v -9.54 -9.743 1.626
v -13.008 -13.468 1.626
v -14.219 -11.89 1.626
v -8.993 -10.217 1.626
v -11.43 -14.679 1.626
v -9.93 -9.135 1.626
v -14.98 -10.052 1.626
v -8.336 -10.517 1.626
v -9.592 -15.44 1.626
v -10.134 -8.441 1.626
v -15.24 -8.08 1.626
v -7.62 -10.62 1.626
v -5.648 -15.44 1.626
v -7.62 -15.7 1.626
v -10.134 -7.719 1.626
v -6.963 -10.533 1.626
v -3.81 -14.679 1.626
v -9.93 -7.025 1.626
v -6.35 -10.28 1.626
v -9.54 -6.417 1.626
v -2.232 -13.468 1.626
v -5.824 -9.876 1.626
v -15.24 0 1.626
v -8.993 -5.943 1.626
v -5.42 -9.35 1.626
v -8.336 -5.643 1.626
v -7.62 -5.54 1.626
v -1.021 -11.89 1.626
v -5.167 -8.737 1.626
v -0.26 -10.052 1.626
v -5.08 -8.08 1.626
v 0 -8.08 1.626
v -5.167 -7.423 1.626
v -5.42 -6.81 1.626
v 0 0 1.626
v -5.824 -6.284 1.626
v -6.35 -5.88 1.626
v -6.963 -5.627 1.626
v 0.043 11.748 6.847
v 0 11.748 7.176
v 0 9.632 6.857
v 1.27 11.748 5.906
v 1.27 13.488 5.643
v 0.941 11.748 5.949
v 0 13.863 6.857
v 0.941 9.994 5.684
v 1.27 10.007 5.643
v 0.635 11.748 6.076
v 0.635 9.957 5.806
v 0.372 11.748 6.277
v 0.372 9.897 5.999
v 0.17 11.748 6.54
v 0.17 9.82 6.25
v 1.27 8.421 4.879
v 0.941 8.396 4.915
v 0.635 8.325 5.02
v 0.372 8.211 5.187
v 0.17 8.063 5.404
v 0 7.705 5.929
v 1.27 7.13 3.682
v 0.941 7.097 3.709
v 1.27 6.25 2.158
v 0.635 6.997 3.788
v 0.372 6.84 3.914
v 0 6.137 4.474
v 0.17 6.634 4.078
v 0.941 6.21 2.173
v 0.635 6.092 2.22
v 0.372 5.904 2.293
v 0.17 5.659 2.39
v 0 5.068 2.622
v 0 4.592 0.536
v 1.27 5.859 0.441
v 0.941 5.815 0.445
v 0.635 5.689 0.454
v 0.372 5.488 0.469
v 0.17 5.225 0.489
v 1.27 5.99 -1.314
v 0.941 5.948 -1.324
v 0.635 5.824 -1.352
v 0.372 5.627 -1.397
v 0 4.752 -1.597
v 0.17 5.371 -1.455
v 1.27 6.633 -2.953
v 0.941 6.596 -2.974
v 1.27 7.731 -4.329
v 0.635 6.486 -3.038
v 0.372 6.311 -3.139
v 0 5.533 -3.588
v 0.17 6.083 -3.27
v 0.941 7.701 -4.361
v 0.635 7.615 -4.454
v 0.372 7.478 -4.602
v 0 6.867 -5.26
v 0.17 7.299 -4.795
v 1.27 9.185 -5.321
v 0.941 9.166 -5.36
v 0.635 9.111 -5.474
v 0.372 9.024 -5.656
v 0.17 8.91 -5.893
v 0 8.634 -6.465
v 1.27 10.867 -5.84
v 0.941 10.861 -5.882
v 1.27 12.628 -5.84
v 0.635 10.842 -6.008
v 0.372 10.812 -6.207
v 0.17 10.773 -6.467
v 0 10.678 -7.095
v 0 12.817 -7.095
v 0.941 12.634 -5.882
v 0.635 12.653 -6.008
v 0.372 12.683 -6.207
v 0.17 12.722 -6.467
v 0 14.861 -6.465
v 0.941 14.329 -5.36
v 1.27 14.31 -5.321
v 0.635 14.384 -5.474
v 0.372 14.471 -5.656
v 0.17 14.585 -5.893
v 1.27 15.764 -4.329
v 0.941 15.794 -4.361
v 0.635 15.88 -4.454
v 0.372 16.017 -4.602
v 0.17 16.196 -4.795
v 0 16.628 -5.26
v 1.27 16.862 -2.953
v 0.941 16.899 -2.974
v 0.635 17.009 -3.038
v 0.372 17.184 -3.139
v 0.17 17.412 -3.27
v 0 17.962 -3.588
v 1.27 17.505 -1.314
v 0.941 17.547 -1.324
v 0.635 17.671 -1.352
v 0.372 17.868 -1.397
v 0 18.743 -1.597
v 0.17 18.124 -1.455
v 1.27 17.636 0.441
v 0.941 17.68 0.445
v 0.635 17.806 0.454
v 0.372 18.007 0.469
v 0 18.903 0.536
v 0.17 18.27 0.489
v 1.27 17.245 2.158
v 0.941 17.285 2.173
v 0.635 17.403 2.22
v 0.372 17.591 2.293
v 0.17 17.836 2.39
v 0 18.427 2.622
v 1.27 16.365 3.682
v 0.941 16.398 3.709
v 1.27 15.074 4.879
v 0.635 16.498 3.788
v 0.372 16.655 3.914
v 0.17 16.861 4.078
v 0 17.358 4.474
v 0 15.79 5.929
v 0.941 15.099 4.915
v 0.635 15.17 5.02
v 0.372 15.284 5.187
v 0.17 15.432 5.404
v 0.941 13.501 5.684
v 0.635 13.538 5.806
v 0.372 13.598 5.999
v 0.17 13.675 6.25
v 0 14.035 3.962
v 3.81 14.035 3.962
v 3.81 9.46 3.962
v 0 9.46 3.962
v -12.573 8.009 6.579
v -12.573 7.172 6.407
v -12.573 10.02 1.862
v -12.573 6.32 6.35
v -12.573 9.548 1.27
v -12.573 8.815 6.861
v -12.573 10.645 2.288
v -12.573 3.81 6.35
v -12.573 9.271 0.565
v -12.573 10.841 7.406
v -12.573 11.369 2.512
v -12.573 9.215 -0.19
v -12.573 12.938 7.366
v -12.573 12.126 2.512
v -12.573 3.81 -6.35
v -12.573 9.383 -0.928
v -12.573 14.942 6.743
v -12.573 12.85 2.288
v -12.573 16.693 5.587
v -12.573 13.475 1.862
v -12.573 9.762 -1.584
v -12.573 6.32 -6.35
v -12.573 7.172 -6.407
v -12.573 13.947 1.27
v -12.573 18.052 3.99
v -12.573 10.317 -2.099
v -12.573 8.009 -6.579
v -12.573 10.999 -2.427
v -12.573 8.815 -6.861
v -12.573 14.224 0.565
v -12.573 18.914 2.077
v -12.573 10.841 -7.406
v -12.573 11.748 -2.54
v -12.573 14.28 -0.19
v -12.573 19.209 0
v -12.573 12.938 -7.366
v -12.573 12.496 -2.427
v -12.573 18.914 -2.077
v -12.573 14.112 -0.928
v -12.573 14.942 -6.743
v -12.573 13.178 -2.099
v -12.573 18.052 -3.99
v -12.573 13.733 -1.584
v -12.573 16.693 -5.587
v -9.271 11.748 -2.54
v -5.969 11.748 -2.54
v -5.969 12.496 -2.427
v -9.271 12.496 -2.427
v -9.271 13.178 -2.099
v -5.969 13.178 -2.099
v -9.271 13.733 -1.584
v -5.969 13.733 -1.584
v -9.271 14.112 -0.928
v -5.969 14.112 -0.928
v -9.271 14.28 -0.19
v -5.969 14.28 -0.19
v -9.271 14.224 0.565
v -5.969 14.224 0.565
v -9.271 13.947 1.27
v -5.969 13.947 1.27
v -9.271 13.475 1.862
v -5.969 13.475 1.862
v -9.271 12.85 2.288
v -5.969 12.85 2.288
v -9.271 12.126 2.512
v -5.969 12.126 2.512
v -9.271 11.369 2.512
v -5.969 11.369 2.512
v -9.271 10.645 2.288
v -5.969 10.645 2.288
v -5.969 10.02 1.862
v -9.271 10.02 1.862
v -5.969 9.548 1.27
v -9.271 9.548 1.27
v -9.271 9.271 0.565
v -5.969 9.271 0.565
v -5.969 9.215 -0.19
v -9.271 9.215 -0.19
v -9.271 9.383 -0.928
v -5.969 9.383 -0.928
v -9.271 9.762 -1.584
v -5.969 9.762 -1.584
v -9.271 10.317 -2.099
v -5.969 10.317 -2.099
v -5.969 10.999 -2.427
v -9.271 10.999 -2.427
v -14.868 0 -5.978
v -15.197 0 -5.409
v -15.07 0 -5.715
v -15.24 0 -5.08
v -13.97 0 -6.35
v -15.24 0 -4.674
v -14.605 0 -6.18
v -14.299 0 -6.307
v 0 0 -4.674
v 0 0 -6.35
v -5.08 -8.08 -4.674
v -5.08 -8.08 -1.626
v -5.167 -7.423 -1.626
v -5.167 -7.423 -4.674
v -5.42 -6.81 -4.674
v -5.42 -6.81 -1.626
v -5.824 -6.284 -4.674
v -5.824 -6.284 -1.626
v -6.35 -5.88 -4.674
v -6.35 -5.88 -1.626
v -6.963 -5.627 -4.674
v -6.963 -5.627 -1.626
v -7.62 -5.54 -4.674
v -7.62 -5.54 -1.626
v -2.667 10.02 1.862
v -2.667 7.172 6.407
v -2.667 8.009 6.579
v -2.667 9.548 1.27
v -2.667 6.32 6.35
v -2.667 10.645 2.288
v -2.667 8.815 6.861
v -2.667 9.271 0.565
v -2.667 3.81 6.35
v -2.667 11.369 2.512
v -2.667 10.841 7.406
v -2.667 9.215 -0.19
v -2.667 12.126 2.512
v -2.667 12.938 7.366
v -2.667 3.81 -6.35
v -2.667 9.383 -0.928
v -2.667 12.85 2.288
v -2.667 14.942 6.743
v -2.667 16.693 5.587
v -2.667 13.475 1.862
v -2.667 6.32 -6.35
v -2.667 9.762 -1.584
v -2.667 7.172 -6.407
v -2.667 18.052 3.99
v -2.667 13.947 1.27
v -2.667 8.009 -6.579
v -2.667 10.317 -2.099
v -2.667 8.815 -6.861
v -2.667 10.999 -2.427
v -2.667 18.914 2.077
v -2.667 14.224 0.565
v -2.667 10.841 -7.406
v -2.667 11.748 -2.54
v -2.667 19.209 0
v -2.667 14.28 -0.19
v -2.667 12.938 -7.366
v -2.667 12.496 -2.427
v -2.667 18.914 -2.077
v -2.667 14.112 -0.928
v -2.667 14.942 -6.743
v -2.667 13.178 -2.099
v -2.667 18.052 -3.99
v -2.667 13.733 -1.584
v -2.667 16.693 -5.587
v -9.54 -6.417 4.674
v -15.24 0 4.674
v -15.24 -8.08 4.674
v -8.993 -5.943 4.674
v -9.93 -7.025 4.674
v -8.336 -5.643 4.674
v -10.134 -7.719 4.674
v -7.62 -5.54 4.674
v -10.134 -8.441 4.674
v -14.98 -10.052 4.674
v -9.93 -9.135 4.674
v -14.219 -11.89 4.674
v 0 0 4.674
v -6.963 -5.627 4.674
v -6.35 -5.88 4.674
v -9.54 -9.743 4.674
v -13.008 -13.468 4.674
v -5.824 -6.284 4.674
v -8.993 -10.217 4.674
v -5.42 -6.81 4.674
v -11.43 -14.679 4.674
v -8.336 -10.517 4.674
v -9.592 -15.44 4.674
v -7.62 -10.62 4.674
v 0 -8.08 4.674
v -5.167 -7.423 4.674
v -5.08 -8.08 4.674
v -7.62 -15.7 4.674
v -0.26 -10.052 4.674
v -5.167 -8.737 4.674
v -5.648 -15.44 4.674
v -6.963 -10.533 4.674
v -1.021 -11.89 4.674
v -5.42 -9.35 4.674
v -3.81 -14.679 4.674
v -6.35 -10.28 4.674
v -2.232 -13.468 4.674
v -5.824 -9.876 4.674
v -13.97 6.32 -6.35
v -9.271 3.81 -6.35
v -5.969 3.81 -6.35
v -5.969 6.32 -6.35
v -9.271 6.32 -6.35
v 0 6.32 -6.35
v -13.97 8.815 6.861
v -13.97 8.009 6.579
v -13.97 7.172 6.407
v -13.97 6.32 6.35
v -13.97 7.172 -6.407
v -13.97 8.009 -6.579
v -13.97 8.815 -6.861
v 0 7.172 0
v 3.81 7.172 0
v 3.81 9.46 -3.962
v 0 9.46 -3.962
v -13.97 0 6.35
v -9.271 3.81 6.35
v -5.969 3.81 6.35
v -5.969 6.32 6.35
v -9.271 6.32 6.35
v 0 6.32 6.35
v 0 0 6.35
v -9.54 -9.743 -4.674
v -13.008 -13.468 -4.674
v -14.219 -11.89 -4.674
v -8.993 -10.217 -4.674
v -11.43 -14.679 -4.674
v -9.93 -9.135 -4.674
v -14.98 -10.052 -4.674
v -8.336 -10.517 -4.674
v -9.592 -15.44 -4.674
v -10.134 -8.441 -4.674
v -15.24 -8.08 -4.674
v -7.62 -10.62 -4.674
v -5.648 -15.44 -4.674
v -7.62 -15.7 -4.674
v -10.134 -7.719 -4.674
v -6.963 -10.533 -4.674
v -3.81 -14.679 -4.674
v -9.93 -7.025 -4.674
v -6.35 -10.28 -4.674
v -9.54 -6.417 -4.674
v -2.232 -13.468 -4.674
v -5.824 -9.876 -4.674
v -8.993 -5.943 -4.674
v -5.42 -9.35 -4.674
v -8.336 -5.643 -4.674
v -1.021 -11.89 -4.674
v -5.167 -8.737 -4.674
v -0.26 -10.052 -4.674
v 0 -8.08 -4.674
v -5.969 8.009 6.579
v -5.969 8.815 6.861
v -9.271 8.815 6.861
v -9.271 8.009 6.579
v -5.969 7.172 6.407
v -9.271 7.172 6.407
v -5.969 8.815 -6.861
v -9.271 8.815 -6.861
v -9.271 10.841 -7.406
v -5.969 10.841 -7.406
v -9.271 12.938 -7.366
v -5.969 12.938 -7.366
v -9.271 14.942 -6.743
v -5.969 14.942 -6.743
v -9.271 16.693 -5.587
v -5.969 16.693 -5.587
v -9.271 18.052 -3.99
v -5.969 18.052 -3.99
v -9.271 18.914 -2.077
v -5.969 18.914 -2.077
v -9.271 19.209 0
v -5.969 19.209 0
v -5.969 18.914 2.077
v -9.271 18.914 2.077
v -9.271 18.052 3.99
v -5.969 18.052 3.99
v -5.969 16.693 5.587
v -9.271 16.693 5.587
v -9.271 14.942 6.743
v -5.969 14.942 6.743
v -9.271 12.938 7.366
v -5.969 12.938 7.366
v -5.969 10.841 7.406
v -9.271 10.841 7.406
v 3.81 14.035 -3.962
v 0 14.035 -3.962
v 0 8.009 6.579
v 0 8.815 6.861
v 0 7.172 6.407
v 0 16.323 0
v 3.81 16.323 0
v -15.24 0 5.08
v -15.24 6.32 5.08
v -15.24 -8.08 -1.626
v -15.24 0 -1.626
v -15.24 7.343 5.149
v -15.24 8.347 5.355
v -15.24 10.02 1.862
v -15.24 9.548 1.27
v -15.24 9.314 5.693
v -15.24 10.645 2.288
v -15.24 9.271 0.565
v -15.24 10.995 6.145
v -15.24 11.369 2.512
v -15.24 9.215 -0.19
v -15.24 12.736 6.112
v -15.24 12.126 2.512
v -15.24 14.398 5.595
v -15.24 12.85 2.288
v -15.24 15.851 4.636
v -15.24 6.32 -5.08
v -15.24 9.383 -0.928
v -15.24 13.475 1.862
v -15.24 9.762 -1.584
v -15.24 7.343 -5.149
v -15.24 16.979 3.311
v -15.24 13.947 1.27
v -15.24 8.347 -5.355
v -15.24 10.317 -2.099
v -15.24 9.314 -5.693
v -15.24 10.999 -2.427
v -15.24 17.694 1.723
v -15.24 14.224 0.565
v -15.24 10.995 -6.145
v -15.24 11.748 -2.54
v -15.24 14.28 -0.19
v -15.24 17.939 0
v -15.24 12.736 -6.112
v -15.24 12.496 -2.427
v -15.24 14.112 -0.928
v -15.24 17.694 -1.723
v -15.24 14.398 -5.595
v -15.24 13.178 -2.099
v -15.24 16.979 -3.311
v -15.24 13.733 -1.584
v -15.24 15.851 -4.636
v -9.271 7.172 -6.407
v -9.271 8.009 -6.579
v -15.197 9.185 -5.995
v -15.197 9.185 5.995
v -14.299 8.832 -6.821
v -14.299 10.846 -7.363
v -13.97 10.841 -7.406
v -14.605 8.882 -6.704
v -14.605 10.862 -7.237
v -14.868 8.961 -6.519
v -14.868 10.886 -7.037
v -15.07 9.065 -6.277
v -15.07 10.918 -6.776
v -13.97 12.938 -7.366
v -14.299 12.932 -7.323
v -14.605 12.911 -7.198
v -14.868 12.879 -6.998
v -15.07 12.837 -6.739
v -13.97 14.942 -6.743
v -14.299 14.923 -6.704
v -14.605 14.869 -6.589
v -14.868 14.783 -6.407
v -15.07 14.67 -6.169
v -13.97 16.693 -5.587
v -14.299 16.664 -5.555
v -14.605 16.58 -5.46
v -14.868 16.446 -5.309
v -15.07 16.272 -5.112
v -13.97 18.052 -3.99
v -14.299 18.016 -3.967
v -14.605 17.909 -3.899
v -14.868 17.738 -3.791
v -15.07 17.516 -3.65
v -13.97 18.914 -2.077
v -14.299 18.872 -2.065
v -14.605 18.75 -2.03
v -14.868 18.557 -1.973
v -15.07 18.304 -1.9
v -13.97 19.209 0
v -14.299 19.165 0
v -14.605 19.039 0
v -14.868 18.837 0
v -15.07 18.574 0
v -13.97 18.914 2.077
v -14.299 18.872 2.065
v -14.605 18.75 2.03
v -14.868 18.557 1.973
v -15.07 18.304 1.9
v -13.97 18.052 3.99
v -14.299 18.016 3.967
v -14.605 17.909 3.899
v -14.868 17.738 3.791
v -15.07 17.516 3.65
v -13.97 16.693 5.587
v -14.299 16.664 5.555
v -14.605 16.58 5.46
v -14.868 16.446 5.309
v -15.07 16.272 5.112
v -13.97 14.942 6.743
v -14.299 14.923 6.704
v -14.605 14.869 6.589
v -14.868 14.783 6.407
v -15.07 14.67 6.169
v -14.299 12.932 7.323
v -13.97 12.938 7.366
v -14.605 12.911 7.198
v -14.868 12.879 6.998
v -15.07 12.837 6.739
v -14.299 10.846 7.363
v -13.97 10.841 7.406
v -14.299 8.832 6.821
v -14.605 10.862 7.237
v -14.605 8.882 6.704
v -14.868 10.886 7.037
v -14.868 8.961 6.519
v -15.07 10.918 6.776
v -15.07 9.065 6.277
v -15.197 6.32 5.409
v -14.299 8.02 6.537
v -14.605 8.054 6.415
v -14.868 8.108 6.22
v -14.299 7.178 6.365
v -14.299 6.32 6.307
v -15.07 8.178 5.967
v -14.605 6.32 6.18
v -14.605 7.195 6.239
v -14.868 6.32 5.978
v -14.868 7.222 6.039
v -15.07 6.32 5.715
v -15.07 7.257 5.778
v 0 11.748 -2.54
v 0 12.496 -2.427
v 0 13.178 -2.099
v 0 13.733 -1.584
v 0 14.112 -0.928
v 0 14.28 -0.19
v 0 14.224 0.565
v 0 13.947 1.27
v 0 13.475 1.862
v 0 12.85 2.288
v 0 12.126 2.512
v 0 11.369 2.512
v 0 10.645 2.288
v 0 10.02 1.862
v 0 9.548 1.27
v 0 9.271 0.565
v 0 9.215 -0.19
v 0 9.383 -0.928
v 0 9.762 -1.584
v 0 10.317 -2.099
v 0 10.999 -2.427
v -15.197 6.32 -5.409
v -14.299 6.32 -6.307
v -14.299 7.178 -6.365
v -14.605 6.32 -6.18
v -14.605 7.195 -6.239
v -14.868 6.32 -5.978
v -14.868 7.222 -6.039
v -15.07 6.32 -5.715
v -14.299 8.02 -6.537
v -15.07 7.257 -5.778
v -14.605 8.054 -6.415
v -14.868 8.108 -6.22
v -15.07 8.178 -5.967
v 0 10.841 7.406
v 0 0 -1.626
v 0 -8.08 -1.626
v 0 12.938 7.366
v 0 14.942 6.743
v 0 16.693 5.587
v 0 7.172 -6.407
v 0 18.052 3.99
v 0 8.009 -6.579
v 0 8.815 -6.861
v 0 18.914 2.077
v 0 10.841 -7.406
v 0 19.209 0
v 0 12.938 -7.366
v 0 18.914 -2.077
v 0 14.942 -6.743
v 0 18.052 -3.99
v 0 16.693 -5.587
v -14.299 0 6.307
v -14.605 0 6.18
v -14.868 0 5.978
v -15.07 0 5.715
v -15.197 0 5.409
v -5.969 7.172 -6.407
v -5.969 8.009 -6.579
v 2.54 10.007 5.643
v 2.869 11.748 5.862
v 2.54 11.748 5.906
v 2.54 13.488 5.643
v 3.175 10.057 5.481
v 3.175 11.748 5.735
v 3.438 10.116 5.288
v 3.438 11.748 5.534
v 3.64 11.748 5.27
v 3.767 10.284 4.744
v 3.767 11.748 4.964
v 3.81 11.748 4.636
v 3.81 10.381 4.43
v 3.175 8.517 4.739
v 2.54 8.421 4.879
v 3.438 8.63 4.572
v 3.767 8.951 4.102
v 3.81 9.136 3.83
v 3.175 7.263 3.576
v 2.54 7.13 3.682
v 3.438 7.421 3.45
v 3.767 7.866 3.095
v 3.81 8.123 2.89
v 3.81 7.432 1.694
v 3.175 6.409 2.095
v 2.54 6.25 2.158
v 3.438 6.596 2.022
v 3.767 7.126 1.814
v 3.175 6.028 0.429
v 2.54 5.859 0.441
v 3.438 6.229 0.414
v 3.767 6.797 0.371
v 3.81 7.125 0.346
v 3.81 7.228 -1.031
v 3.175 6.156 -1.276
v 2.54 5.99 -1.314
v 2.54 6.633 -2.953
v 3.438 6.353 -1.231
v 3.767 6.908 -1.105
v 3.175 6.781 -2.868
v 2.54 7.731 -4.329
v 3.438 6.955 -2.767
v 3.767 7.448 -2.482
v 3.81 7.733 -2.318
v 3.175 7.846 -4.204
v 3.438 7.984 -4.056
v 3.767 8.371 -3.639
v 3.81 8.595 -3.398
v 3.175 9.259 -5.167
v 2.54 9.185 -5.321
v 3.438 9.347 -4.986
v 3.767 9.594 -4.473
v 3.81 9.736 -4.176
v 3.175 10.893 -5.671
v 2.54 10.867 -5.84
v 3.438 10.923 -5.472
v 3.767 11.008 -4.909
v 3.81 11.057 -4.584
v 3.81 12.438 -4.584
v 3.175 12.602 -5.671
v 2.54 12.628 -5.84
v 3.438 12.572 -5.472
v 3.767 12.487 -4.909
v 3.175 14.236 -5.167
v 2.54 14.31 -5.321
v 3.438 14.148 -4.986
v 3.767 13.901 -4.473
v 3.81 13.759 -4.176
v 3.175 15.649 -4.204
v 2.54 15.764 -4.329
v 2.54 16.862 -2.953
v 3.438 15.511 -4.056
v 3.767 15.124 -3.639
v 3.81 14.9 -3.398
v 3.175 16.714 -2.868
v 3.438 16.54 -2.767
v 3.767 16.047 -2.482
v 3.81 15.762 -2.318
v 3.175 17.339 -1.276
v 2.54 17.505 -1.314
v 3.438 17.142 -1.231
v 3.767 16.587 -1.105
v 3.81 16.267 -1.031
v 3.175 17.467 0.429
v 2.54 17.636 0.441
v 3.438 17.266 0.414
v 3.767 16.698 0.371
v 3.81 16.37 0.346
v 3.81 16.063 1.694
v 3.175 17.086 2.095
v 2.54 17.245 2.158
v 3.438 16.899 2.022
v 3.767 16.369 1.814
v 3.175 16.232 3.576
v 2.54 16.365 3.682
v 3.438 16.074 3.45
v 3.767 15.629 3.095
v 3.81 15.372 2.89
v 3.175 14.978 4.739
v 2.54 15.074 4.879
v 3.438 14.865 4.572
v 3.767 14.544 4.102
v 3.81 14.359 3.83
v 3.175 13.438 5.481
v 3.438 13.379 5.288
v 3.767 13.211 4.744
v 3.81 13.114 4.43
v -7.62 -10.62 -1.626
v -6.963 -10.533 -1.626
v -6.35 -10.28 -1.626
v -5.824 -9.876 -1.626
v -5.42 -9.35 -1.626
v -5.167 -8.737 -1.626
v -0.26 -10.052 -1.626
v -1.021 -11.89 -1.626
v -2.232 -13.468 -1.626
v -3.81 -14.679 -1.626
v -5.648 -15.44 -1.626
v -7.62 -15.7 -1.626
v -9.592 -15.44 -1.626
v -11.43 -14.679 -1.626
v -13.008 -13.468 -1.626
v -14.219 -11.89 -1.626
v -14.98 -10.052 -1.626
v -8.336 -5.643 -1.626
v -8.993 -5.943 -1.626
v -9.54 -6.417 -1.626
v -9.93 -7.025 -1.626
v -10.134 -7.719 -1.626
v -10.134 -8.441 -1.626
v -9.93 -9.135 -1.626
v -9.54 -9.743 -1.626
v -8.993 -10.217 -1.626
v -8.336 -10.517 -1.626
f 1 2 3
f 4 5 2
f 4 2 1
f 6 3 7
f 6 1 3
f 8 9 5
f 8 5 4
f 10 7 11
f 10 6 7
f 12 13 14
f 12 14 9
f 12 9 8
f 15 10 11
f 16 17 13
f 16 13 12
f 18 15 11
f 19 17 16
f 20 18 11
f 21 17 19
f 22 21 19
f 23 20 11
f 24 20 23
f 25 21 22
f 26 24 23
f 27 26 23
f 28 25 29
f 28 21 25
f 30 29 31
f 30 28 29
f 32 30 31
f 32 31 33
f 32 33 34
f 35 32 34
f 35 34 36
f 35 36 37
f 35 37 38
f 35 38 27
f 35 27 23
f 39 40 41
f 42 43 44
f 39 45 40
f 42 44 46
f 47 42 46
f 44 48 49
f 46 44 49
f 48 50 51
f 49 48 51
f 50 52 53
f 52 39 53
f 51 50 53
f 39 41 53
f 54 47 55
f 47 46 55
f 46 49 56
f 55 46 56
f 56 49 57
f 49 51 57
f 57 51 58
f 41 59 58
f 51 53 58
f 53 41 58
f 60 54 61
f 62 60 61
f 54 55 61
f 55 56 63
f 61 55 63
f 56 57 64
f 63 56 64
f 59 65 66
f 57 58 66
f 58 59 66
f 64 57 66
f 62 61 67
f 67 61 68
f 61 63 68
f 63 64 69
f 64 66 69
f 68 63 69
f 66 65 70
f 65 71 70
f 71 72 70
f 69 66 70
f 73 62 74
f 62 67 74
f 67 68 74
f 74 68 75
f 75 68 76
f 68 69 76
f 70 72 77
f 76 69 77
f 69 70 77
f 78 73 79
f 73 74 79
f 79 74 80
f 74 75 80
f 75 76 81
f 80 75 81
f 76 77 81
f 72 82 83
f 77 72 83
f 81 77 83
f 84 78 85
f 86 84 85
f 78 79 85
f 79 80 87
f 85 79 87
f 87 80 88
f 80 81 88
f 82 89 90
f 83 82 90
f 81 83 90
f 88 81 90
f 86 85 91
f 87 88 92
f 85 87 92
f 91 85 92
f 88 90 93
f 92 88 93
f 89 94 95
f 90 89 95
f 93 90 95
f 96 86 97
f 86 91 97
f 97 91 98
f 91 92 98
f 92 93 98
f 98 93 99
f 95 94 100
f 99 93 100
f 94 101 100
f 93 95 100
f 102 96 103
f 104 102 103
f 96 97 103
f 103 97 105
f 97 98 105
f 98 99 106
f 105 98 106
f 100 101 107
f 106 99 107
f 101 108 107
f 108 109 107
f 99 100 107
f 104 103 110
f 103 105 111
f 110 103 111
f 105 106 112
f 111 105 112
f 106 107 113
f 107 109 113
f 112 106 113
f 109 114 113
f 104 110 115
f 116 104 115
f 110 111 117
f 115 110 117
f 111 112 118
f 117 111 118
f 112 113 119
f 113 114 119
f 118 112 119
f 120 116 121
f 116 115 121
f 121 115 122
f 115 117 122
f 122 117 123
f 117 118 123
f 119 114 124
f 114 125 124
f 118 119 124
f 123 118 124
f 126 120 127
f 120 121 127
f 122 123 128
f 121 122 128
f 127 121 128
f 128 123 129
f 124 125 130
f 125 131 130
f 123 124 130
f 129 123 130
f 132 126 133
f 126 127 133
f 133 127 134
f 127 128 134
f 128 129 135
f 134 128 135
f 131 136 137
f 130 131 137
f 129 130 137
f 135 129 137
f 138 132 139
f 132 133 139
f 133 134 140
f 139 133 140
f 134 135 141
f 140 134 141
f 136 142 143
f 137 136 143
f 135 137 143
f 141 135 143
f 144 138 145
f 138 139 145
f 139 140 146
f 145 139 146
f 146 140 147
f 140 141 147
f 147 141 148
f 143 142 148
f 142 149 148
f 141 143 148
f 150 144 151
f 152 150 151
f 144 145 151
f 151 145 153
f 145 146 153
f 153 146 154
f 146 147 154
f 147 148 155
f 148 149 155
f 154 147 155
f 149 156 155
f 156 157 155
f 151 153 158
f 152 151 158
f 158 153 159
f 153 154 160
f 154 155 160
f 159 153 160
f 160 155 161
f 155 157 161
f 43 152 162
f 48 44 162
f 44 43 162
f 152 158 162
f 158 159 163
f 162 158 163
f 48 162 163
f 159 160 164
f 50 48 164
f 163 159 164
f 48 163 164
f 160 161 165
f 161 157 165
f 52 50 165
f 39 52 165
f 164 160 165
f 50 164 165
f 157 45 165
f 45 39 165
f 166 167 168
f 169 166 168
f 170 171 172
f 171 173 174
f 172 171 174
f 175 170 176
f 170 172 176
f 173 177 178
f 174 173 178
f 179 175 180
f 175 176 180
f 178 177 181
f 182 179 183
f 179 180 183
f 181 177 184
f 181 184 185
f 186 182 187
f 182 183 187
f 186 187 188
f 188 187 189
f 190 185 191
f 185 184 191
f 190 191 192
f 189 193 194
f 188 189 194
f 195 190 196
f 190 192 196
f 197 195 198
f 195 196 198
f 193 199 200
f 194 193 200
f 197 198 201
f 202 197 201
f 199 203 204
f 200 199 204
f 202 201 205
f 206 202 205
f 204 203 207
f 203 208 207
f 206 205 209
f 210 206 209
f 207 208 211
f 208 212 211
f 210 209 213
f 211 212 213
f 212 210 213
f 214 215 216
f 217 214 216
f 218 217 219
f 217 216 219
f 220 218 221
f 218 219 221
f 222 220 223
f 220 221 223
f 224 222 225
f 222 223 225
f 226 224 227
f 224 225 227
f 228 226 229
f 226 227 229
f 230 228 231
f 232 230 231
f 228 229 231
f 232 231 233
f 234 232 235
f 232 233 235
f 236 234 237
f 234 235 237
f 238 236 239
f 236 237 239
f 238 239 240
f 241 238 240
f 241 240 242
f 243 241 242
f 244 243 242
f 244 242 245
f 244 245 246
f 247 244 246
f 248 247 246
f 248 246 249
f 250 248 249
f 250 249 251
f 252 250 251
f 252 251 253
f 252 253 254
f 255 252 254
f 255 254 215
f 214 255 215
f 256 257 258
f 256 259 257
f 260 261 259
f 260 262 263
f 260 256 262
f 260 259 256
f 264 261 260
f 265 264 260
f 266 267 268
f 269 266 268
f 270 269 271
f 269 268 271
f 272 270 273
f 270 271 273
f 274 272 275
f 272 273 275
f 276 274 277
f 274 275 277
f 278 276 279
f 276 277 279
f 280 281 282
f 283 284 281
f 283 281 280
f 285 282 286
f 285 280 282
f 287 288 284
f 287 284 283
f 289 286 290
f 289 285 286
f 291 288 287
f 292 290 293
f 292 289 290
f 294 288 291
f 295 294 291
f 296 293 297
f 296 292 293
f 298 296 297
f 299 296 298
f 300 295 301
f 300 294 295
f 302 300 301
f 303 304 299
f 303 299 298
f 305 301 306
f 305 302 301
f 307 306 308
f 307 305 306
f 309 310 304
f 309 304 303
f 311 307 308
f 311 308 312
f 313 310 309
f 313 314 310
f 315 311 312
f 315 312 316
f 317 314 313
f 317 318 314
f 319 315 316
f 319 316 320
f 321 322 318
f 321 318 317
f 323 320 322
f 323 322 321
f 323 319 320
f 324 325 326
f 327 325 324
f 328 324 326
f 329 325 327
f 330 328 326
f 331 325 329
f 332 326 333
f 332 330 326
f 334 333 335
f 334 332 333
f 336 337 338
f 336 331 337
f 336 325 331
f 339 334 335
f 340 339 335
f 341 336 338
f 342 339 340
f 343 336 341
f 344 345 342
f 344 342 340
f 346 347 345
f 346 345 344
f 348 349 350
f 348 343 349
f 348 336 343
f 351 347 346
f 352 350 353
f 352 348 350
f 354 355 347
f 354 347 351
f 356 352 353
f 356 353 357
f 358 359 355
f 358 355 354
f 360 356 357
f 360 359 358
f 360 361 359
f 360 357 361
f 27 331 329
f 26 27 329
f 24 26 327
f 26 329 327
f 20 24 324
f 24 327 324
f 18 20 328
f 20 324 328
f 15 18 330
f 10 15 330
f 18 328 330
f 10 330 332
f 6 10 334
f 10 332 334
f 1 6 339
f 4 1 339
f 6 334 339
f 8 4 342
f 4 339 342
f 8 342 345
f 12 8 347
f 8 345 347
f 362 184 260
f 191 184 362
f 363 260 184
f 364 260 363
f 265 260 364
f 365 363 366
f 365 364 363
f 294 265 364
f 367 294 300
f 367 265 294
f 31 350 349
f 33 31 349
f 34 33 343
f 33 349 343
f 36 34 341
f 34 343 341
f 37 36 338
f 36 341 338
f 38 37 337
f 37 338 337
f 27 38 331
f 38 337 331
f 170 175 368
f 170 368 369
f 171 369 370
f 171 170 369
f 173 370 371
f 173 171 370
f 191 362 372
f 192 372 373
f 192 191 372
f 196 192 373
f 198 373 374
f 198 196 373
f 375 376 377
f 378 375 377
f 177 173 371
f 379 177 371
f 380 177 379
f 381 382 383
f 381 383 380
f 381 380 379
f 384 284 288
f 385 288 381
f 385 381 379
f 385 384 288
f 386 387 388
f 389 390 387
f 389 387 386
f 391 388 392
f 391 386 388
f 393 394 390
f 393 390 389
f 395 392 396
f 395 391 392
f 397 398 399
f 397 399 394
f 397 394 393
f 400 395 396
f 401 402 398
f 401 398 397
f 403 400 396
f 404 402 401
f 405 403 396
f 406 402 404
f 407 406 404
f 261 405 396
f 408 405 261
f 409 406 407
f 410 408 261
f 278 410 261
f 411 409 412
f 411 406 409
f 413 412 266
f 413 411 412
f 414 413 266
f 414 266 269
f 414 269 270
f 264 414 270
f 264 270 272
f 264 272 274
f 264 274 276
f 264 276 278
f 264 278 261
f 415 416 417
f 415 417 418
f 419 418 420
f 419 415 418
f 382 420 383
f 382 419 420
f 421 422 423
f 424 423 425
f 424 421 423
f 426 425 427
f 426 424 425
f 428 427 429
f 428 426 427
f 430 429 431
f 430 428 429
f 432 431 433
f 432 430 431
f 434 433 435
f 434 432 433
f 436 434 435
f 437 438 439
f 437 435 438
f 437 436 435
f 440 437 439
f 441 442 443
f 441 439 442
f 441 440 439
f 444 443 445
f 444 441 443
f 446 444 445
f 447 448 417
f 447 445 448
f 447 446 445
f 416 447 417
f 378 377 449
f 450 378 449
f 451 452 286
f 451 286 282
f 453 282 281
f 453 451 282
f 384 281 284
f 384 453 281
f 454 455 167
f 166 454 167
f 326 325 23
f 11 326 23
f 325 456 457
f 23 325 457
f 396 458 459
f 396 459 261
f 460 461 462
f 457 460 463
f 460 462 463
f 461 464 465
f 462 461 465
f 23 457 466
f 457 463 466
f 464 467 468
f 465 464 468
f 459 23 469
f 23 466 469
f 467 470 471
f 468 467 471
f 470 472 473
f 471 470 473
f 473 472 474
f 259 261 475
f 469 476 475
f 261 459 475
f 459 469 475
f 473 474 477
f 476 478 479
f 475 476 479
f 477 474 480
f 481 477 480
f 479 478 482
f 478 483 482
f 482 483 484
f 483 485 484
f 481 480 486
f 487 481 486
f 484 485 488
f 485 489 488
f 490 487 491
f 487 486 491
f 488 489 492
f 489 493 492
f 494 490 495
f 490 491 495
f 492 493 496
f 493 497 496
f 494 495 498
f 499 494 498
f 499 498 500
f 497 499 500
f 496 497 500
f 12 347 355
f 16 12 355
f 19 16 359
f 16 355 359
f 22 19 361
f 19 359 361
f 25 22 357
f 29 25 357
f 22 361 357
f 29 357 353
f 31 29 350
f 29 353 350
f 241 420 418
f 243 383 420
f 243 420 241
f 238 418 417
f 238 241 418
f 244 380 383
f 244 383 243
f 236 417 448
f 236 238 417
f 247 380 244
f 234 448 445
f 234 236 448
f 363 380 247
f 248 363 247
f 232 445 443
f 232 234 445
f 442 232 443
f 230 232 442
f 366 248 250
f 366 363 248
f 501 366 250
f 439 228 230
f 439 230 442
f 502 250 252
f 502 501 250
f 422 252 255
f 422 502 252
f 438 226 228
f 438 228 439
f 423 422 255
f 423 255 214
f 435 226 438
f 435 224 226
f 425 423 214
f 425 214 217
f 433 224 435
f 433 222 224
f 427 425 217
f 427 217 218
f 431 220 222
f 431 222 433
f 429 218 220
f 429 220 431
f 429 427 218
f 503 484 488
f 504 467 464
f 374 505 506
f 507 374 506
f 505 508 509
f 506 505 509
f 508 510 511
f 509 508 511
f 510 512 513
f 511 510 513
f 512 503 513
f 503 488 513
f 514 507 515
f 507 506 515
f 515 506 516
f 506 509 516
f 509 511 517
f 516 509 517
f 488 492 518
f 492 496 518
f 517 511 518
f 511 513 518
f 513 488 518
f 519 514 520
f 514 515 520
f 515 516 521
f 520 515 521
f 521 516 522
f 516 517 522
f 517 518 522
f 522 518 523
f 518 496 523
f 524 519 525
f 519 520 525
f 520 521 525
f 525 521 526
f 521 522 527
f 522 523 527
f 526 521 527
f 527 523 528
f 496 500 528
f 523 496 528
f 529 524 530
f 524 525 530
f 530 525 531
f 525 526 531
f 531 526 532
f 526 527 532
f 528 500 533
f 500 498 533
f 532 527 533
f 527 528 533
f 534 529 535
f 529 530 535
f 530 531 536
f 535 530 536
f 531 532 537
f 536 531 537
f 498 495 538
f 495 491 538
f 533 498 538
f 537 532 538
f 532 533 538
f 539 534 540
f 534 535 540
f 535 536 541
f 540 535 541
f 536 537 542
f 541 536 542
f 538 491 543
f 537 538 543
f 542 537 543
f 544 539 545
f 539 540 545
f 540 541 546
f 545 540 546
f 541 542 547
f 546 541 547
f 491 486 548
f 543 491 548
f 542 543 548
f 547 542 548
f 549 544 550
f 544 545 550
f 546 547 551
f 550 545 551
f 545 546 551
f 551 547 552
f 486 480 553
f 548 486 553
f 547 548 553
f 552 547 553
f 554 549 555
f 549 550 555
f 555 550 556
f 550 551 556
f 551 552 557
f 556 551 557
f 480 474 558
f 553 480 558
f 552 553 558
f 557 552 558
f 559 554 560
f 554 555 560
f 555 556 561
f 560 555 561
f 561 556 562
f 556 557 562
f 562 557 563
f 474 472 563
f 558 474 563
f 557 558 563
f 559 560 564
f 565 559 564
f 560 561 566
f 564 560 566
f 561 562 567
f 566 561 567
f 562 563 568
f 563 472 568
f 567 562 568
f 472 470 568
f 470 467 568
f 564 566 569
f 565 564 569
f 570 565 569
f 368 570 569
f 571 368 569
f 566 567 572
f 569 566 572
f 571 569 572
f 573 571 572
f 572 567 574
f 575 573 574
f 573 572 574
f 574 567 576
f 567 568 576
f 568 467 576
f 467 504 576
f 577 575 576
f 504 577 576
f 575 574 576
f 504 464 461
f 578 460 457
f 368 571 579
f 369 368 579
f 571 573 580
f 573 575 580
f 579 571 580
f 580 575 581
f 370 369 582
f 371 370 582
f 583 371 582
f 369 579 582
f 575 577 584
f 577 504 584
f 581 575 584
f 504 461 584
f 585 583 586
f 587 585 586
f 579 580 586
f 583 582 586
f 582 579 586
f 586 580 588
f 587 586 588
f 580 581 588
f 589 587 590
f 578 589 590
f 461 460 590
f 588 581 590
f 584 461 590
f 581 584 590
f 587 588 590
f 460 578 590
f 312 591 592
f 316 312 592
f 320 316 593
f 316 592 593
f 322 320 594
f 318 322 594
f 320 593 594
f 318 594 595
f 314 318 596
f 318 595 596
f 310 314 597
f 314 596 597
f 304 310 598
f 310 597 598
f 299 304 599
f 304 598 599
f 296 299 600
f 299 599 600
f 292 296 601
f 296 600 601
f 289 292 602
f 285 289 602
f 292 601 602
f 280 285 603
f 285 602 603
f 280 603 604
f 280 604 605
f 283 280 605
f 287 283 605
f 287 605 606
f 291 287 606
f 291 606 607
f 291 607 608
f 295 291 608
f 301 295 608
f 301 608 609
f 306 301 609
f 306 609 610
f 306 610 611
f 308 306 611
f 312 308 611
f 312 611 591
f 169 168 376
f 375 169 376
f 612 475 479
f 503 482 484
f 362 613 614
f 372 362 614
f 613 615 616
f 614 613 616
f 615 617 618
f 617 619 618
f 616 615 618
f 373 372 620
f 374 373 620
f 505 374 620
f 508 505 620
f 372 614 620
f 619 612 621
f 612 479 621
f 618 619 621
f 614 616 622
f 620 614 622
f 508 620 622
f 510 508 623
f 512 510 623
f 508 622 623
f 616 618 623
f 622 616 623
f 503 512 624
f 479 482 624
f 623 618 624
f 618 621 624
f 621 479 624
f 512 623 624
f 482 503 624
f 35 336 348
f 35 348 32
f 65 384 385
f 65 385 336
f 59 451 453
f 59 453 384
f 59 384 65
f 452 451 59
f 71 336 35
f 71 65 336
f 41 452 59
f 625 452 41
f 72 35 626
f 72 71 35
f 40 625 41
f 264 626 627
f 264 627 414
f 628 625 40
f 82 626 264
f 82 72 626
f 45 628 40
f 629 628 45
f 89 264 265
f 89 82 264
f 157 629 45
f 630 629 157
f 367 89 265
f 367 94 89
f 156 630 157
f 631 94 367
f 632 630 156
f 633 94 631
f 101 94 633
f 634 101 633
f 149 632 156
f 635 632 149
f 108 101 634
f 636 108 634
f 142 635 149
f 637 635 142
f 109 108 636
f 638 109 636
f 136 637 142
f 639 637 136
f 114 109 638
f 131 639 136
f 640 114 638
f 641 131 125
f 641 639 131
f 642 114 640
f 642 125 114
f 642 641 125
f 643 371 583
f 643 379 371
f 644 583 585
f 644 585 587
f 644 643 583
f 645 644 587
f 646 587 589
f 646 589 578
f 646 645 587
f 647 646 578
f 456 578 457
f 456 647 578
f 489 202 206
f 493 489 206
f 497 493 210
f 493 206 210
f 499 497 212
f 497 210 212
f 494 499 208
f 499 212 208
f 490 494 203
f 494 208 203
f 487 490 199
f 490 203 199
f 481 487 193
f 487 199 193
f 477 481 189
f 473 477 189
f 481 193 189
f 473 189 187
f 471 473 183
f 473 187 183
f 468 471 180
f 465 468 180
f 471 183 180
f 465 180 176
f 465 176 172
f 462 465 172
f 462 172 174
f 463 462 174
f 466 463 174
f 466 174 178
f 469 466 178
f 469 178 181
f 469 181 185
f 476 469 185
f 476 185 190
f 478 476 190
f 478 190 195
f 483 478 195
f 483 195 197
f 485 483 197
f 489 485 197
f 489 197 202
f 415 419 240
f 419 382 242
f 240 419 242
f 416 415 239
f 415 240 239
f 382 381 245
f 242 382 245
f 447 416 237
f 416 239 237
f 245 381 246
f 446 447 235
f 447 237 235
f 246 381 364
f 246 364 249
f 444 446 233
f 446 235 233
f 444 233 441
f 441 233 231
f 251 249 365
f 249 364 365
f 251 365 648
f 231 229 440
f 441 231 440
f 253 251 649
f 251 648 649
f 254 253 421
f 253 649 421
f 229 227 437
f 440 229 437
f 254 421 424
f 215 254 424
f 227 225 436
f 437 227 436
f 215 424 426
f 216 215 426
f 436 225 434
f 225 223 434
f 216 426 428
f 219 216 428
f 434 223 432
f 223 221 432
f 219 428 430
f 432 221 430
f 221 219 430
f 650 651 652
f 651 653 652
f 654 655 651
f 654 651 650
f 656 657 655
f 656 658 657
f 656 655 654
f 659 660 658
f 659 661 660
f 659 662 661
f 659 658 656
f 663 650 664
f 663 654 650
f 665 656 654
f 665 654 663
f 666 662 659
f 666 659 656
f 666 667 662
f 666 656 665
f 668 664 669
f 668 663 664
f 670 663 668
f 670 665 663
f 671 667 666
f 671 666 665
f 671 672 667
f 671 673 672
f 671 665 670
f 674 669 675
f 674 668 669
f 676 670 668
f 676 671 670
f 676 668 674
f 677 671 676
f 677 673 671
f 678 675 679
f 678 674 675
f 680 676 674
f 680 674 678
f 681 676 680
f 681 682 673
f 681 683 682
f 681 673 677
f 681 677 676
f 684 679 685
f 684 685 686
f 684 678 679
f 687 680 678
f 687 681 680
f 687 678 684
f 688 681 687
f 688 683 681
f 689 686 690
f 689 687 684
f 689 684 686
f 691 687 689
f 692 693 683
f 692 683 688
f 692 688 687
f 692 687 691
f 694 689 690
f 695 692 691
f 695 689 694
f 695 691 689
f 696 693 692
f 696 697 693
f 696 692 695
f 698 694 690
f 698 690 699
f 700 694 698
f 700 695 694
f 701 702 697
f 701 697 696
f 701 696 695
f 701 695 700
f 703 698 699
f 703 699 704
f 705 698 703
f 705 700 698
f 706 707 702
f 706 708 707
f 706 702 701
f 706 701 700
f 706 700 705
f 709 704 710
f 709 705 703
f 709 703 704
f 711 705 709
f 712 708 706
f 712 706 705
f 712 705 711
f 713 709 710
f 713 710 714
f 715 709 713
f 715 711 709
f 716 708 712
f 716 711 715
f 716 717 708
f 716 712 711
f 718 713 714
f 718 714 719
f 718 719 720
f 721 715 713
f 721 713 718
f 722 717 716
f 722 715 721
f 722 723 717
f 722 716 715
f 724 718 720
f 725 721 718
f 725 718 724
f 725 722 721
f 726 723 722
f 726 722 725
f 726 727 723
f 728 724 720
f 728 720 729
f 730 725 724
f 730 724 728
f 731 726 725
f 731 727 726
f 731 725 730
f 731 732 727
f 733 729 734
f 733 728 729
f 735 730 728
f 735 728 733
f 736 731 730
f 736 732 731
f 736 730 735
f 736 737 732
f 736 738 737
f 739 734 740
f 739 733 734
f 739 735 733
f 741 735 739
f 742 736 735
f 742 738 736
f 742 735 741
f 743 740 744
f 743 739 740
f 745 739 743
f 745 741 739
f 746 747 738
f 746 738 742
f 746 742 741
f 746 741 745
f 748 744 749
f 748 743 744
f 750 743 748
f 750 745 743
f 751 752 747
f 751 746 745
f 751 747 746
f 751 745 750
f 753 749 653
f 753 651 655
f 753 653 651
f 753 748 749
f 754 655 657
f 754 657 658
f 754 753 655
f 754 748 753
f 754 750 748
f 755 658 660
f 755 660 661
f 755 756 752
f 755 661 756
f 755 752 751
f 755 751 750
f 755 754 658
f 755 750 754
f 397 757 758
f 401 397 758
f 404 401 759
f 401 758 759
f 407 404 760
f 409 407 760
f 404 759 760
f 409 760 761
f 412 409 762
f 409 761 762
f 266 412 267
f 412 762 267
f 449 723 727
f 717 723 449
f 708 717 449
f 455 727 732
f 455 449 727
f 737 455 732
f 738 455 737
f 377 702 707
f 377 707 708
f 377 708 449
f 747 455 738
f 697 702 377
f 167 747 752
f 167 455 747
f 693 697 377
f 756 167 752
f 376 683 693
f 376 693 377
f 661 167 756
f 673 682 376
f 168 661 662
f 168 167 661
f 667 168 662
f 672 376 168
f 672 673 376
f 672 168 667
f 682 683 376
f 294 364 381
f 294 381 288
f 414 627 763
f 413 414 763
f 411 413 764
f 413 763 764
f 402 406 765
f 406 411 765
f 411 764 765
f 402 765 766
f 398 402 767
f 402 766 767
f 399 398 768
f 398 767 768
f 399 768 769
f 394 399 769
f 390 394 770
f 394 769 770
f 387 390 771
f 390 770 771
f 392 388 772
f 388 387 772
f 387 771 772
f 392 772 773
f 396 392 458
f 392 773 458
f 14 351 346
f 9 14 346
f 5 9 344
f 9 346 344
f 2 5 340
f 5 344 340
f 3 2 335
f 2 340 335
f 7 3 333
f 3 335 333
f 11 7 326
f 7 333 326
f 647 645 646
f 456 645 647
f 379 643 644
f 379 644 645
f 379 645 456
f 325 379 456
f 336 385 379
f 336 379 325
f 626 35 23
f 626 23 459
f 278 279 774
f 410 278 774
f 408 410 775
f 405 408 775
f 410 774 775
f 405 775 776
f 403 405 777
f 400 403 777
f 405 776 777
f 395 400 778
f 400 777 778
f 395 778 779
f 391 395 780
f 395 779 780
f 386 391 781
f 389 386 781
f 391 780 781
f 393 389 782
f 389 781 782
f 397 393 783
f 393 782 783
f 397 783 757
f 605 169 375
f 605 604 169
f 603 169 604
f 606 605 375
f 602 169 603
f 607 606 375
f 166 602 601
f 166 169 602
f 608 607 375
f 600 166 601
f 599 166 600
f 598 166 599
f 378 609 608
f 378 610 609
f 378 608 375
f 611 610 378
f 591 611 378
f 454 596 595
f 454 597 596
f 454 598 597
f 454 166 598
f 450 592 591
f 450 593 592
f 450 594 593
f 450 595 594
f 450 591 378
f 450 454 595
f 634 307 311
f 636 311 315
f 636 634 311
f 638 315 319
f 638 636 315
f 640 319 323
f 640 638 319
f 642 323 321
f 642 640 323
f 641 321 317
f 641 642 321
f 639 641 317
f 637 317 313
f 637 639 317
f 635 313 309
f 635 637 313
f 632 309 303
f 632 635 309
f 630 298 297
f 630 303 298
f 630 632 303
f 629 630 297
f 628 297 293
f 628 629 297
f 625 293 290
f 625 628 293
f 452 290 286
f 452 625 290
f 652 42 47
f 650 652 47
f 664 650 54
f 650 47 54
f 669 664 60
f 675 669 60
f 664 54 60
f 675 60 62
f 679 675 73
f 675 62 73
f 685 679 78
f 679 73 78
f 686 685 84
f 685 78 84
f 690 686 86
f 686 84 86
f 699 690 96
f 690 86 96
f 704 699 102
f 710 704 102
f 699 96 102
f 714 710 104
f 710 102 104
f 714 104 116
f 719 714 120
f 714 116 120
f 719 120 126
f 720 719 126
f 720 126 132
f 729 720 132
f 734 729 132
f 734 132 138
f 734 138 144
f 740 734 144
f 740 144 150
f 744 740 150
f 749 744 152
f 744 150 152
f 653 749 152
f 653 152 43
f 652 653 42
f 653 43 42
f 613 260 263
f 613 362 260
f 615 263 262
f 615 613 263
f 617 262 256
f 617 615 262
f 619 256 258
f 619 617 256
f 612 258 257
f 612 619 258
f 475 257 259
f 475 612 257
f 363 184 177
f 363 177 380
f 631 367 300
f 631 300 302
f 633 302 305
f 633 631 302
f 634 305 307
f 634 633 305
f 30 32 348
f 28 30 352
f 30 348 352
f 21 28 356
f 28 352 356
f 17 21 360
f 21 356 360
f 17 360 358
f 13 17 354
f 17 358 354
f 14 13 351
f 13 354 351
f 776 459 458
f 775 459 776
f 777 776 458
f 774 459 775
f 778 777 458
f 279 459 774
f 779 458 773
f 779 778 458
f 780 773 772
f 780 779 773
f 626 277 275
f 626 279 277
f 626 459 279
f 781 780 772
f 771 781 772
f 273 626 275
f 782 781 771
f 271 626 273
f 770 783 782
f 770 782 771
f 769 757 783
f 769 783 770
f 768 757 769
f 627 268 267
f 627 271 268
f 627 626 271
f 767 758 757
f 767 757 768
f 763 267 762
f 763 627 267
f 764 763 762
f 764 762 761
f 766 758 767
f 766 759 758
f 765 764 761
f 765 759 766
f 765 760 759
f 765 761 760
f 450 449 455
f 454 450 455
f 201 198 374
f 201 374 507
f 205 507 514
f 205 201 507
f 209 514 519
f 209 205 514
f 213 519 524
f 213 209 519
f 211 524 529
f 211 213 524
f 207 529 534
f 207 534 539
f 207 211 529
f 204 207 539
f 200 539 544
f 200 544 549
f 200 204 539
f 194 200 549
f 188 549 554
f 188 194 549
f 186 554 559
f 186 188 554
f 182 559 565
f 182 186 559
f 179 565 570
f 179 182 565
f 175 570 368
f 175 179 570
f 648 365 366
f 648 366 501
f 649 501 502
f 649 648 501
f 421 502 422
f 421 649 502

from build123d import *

# Parameters (mm, degrees)
SKETCH1_R               = 2.54
BOSS_EXTRUDE1_DEPTH     = 15.24
CUT_EXTRUDE1_DEPTH      = 28.358513503
SKETCH3_W               = 3.302
SKETCH3_H               = 15.39875
CUT_EXTRUDE2_DEPTH      = 26.630137107
CUT_EXTRUDE2_DEPTH_BACK = 26.630137107
SKETCH5_R               = 5.9055
SKETCH5_R_2             = 2.54
BOSS_EXTRUDE2_DEPTH     = 3.81
CUT_EXTRUDE3_DEPTH      = 3.81
FILLET1_R               = 1.27


with BuildPart() as part:
    # Sketch1 → Boss-Extrude1 (new body)
    with BuildSketch(Plane(origin=(0, 0, 0), x_dir=(0, 0, -1), z_dir=(1, 0, 0))):
        with BuildLine():
            Line((-6.35, 0), (-4.6736, 0))
            Line((-4.6736, 0), (-4.6736, -15.7))
            Line((-4.6736, -15.7), (-1.6256, -15.7))
            Line((-1.6256, -15.7), (-1.6256, 0))
            Line((-1.6256, 0), (1.6256, 0))
            Line((1.6256, 0), (1.6256, -15.7))
            Line((1.6256, -15.7), (4.6736, -15.7))
            Line((4.6736, -15.7), (4.6736, 0))
            Line((4.6736, 0), (6.35, 0))
            Line((6.35, 0), (6.35, 6.319735583))
            ThreePointArc((6.35, 6.319735583), (6.479041034, 7.59337978), (6.86091954, 8.815259453))
            ThreePointArc((6.86091954, 8.815259453), (0, 19.20875), (-6.86091954, 8.815259453))
            ThreePointArc((-6.86091954, 8.815259453), (-6.479041034, 7.59337978), (-6.35, 6.319735583))
            Line((-6.35, 6.319735583), (-6.35, 0))
        make_face()
        with Locations((0, 11.7475)):
            Circle(SKETCH1_R, mode=Mode.SUBTRACT)
    extrude(amount=-BOSS_EXTRUDE1_DEPTH)

    # Sketch2 → Cut-Extrude1 (cut, through all)
    with BuildSketch(Plane.XY.offset(4.6736)):
        with BuildLine():
            ThreePointArc((-5.08, -8.08), (-5.823948776, -6.283948776), (-7.62, -5.54))
            Line((-7.62, -5.54), (-7.62, -10.62))
            ThreePointArc((-7.62, -10.62), (-5.823948776, -9.876051224), (-5.08, -8.08))
        make_face()
        with BuildLine():
            Line((-7.62, -10.62), (-7.62, -5.54))
            ThreePointArc((-7.62, -5.54), (-10.16, -8.08), (-7.62, -10.62))
        make_face()
        with BuildLine():
            ThreePointArc((-7.62, -15.7), (-13.008153673, -13.468153673), (-15.24, -8.08))
            Line((-15.24, -8.08), (-15.24, -15.7))
            Line((-15.24, -15.7), (-7.62, -15.7))
        make_face()
        with BuildLine():
            Line((0, -15.7), (0, -8.08))
            ThreePointArc((0, -8.08), (-2.231846327, -13.468153673), (-7.62, -15.7))
            Line((-7.62, -15.7), (0, -15.7))
        make_face()
    extrude(amount=-CUT_EXTRUDE1_DEPTH, mode=Mode.SUBTRACT)

    # Sketch3 → Cut-Extrude2 (cut, two sides)
    with BuildSketch(Plane.XY) as cut_extrude2_sk:
        with Locations((-4.318, 11.509375)):
            Rectangle(SKETCH3_W, SKETCH3_H)
        with Locations((-10.922, 11.509375)):
            Rectangle(SKETCH3_W, SKETCH3_H)
    extrude(amount=CUT_EXTRUDE2_DEPTH, mode=Mode.SUBTRACT)
    extrude(cut_extrude2_sk.sketch, amount=-CUT_EXTRUDE2_DEPTH_BACK, mode=Mode.SUBTRACT)

    # Sketch5 → Boss-Extrude2 (add)
    with BuildSketch(Plane(origin=(0, 0, 0), x_dir=(0, 0, -1), z_dir=(1, 0, 0))):
        with Locations(Location((0, 11.7475, 0), (0, 0, 180))):
            Circle(SKETCH5_R)
        with Locations((0, 11.7475)):
            Circle(SKETCH5_R_2, mode=Mode.SUBTRACT)
    extrude(amount=BOSS_EXTRUDE2_DEPTH)

    # Sketch6 → Cut-Extrude3 (cut)
    with BuildSketch(Plane(origin=(3.81, 0, 0), x_dir=(0, 0, -1), z_dir=(1, 0, 0))):
        Polygon((0, 16.322885413), (-3.9624, 14.035192707), (-3.9624, 9.459807293), (0, 7.172114587), (3.9624, 9.459807293), (3.9624, 14.035192707), align=None)
    extrude(amount=-CUT_EXTRUDE3_DEPTH, mode=Mode.SUBTRACT)

    # Fillet1
    fillet1_edges = [part.edges().sort_by_distance(p)[0] for p in [
        (0, 11.7475, -5.9055),
        (3.81, 11.7475, -5.9055),
        (-15.24, 3.159867792, -6.35),
        (-15.24, 7.59337978, -6.479041034),
        (-15.24, 3.159867792, 6.35),
        (-15.24, 19.20875, 0),
        (-15.24, 7.59337978, 6.479041034),
    ]]
    fillet(fillet1_edges, radius=FILLET1_R)


solid = part.part
